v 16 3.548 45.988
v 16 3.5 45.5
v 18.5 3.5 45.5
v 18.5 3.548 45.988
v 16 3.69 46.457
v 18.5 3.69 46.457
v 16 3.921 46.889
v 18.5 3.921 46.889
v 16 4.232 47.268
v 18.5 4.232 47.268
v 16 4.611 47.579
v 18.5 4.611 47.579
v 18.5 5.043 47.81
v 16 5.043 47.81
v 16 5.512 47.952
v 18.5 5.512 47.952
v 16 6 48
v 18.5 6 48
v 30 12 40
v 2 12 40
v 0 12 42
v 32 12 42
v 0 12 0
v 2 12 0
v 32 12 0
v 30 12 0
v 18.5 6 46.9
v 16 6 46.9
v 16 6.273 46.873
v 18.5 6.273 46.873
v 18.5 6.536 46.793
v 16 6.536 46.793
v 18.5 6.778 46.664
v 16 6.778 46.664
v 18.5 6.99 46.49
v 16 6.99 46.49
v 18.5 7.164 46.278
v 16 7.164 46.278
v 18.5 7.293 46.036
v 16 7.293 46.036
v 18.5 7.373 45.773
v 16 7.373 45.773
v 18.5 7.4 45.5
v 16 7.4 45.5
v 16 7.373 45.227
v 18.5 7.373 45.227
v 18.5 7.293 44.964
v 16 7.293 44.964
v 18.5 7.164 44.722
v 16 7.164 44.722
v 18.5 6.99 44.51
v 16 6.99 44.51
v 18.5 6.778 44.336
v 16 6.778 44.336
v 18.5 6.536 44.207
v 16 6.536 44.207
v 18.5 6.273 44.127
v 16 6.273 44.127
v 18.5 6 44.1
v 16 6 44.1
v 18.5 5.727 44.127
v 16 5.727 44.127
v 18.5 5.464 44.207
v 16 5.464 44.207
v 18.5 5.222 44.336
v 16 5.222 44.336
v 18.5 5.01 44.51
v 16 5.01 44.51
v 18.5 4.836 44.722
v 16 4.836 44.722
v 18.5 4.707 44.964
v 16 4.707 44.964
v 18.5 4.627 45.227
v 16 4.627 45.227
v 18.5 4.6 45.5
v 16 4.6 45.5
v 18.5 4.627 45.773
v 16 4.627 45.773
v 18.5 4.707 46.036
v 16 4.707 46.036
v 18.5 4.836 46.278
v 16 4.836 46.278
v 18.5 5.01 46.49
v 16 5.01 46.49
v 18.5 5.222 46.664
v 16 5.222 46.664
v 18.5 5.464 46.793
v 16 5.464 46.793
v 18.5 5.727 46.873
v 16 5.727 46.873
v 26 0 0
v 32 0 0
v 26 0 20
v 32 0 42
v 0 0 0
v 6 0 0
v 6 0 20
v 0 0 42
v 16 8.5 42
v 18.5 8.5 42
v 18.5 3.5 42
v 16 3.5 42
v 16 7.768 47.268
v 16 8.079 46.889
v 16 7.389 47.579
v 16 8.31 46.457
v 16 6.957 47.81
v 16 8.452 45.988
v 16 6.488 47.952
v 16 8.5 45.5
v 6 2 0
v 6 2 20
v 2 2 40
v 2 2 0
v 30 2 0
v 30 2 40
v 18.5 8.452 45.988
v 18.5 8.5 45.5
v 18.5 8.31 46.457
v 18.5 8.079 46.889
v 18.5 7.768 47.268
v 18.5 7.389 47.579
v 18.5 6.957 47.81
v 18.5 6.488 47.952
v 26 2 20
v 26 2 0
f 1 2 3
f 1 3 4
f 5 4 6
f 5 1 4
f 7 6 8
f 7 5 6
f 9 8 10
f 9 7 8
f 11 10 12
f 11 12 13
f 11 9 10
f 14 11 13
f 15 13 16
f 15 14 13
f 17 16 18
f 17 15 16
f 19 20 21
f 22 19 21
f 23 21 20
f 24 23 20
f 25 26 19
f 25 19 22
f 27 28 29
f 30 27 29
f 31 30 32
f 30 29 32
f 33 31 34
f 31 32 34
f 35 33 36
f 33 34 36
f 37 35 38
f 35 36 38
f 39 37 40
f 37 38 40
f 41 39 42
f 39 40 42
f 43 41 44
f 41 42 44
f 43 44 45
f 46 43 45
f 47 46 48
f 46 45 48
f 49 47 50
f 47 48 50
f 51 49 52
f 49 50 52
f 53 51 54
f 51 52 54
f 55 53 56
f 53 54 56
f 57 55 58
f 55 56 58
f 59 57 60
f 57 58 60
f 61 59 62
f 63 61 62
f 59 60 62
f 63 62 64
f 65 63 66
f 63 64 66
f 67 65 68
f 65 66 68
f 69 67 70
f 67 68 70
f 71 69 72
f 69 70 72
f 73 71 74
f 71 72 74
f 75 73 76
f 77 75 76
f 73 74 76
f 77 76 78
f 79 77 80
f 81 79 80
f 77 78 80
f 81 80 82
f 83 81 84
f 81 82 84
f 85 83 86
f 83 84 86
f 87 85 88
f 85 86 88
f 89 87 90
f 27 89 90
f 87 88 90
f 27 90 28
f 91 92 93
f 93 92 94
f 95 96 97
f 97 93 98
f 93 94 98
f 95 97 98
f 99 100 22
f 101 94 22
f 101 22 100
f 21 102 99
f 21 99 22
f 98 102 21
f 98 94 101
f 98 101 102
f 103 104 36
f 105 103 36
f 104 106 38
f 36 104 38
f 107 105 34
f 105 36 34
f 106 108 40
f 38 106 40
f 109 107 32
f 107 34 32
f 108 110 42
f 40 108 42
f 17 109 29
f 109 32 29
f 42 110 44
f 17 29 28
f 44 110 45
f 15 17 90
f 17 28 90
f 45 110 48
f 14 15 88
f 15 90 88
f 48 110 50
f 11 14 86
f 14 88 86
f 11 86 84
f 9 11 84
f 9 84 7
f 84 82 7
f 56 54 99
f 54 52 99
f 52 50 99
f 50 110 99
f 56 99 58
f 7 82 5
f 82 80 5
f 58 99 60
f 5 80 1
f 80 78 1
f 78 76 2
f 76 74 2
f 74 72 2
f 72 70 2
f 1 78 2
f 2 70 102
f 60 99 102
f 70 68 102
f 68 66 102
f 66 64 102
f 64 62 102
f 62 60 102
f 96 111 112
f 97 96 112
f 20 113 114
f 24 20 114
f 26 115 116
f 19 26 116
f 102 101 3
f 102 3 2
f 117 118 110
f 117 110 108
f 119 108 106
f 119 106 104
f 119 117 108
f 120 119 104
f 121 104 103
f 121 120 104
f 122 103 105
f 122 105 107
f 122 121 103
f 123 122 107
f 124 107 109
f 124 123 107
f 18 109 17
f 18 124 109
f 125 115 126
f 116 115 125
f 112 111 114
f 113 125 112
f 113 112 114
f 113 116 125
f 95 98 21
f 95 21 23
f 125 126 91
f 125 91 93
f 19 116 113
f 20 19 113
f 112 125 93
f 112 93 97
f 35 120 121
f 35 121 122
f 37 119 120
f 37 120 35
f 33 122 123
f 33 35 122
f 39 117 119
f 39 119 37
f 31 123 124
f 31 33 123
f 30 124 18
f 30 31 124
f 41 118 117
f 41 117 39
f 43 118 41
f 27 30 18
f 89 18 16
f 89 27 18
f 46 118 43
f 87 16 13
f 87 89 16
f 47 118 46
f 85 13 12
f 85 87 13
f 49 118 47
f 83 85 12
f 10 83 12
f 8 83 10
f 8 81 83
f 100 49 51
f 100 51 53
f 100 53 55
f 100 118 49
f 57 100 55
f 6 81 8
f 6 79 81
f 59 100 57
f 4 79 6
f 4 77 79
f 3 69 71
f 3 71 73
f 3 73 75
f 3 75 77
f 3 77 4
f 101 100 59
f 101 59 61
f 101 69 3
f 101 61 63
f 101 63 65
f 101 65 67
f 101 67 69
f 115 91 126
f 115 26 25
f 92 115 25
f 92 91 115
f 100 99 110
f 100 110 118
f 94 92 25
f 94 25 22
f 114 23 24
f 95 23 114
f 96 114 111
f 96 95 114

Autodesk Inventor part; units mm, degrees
ref_plane "YZ Plane" through (0, 0, 0) normal (1, 0, 0) x (0, 1, 0)
ref_plane "XZ Plane" through (0, 0, 0) normal (0, 1, 0) x (-1, 0, 0)
ref_plane "XY Plane" through (0, 0, 0) normal (0, 0, 1) x (1, 0, 0)
sketch "Sketch1" plane through (0, 0, 0) normal (0, 1, 0) x (-1, 0, 0)
  line L0 (0, 0) -> (-32, 0)
  line L1 (-32, 0) -> (-32, 42)
  line L2 (-32, 42) -> (0, 42)
  line L3 (0, 42) -> (0, 0)
  dimension "d0" = 32
  dimension "d1" = 42
extrude "Extrusion1" add sketch "Sketch1" along normal blind 2
sketch "Sketch2" plane through (0, 2, 0) normal (0, 1, 0) x (1, 0, 0)
  line L0 (0, -42) -> (32, -42) projected
  line L1 (0, 0) -> (32, 0)
  line L2 (32, 0) -> (32, -42)
  line L3 (32, -42) -> (0, -42)
  line L4 (0, -42) -> (0, 0)
  line L5 (0, 0) -> (0, -42) projected
  line L6 (0, 0) -> (2, 0)
  line L7 (2, 0) -> (2, -2)
  line L8 (2, -2) -> (0, -2)
  line L9 (0, -2) -> (0, 0)
  line L10 (32, -42) -> (30, -42)
  line L11 (30, -42) -> (30, -40)
  line L12 (30, -40) -> (32, -40)
  line L13 (32, -40) -> (32, -42)
  line L14 (30, -40) -> (2, -40)
  line L15 (2, -40) -> (2, -2)
  line L16 (2, -2) -> (30, -2)
  line L17 (30, -2) -> (30, -40)
  line L18 (32, -42) -> (32, 0) projected
  line L19 (30, -2) -> (32, -2)
  line L20 (32, -2) -> (32, 0)
  line L21 (32, 0) -> (30, 0)
  line L22 (30, 0) -> (30, -2)
  dimension "d4" = 2
  dimension "d5" = 2
  dimension "d6" = 2
  dimension "d7" = 2
extrude "Extrusion2" add sketch "Sketch2" along normal blind 10 contours L4 L8 L15 L14 L11 L0 | L11 L12 L2 L0 | L4 L1 L7 L8 | L17 L19 L2 L12 | L22 L1 L2 L19
sketch "Sketch3" plane through (0, 2, 0) normal (0, 1, 0) x (1, 0, 0)
  line L0 (30, 0) -> (2, 0) projected
  line L1 (30, 0) -> (30, -40) projected
  line L2 (2, 0) -> (30, 0)
  line L3 (30, 0) -> (30, -40)
  line L4 (30, -40) -> (2, -40)
  line L5 (2, -40) -> (2, 0)
  line L6 (2, 0) -> (6, 0)
  line L7 (6, 0) -> (6, -4)
  line L8 (6, -4) -> (2, -4)
  line L9 (2, -4) -> (2, 0)
  line L10 (30, 0) -> (26, 0)
  line L11 (26, 0) -> (26, -4)
  line L12 (26, -4) -> (30, -4)
  line L13 (30, -4) -> (30, 0)
  line L14 (6, 0) -> (26, 0)
  line L15 (26, 0) -> (26, -20)
  line L16 (26, -20) -> (6, -20)
  line L17 (6, -20) -> (6, 0)
  point P0 (0, 0)
  dimension "d10" = 4
  dimension "d11" = 4
  dimension "d12" = 4
  dimension "d13" = 4
  dimension "d14" = 20
  dimension "d15" = 20
extrude "Extrusion3" cut sketch "Sketch3" against normal through all contours L11 L15 L16 L17 L7 L0
sketch "Sketch4" plane through (0, 0, 42) normal (0, 0, 1) x (1, 0, 0)
  line L0 (2, 12) -> (0, 12) projected
  line L1 (32, 0) -> (26, 0) projected
  line L2 (0, 12) -> (32, 12)
  line L3 (32, 12) -> (32, 0)
  line L4 (32, 0) -> (0, 0)
  line L5 (0, 0) -> (0, 12)
  line L6 (0, 12) -> (13.5, 12)
  line L7 (13.5, 12) -> (13.5, 8.5)
  line L8 (13.5, 8.5) -> (0, 8.5)
  line L9 (0, 8.5) -> (0, 12)
  line L10 (13.5, 8.5) -> (18.5, 8.5)
  line L11 (18.5, 8.5) -> (18.5, 3.5)
  line L12 (18.5, 3.5) -> (13.5, 3.5)
  line L13 (13.5, 3.5) -> (13.5, 8.5)
  line L14 (18.5, 8.5) -> (16, 8.5)
  line L15 (16, 8.5) -> (16, 3.5)
  line L16 (16, 3.5) -> (18.5, 3.5)
  line L17 (18.5, 3.5) -> (18.5, 8.5)
  dimension "d18" = 13.5
  dimension "d19" = 3.5
  dimension "d20" = 5
  dimension "d21" = 5
extrude "Extrusion4" add sketch "Sketch4" along normal blind 6 contours L10 L11 L12 L15
sketch "Sketch5" plane through (16, 3.5, 42) normal (-1, 0, 0) x (0, 0, 1)
  line L0 (6, 0) -> (6, 5) projected
  line L1 (6, 5) -> (3.5, 5)
  line L2 (3.5, 5) -> (3.5, 2.5)
  line L3 (3.5, 2.5) -> (6, 2.5)
  line L4 (6, 2.5) -> (6, 5)
  circle A0 centre (3.5, 2.5) radius 1.4
  point P0 (-42, -3.5)
  dimension "d24" = 2.5
  dimension "d25" = 2.5
  dimension "d26" = 2.8
extrude "Extrusion5" cut sketch "Sketch5" against normal through all contours A0 L2 L3 | L3 L2 A0
fillet "Fillet1" radius 2.5 2 edges at (17.25, 8.5, 48) (17.25, 3.5, 48)
properties part number "CAM04"
